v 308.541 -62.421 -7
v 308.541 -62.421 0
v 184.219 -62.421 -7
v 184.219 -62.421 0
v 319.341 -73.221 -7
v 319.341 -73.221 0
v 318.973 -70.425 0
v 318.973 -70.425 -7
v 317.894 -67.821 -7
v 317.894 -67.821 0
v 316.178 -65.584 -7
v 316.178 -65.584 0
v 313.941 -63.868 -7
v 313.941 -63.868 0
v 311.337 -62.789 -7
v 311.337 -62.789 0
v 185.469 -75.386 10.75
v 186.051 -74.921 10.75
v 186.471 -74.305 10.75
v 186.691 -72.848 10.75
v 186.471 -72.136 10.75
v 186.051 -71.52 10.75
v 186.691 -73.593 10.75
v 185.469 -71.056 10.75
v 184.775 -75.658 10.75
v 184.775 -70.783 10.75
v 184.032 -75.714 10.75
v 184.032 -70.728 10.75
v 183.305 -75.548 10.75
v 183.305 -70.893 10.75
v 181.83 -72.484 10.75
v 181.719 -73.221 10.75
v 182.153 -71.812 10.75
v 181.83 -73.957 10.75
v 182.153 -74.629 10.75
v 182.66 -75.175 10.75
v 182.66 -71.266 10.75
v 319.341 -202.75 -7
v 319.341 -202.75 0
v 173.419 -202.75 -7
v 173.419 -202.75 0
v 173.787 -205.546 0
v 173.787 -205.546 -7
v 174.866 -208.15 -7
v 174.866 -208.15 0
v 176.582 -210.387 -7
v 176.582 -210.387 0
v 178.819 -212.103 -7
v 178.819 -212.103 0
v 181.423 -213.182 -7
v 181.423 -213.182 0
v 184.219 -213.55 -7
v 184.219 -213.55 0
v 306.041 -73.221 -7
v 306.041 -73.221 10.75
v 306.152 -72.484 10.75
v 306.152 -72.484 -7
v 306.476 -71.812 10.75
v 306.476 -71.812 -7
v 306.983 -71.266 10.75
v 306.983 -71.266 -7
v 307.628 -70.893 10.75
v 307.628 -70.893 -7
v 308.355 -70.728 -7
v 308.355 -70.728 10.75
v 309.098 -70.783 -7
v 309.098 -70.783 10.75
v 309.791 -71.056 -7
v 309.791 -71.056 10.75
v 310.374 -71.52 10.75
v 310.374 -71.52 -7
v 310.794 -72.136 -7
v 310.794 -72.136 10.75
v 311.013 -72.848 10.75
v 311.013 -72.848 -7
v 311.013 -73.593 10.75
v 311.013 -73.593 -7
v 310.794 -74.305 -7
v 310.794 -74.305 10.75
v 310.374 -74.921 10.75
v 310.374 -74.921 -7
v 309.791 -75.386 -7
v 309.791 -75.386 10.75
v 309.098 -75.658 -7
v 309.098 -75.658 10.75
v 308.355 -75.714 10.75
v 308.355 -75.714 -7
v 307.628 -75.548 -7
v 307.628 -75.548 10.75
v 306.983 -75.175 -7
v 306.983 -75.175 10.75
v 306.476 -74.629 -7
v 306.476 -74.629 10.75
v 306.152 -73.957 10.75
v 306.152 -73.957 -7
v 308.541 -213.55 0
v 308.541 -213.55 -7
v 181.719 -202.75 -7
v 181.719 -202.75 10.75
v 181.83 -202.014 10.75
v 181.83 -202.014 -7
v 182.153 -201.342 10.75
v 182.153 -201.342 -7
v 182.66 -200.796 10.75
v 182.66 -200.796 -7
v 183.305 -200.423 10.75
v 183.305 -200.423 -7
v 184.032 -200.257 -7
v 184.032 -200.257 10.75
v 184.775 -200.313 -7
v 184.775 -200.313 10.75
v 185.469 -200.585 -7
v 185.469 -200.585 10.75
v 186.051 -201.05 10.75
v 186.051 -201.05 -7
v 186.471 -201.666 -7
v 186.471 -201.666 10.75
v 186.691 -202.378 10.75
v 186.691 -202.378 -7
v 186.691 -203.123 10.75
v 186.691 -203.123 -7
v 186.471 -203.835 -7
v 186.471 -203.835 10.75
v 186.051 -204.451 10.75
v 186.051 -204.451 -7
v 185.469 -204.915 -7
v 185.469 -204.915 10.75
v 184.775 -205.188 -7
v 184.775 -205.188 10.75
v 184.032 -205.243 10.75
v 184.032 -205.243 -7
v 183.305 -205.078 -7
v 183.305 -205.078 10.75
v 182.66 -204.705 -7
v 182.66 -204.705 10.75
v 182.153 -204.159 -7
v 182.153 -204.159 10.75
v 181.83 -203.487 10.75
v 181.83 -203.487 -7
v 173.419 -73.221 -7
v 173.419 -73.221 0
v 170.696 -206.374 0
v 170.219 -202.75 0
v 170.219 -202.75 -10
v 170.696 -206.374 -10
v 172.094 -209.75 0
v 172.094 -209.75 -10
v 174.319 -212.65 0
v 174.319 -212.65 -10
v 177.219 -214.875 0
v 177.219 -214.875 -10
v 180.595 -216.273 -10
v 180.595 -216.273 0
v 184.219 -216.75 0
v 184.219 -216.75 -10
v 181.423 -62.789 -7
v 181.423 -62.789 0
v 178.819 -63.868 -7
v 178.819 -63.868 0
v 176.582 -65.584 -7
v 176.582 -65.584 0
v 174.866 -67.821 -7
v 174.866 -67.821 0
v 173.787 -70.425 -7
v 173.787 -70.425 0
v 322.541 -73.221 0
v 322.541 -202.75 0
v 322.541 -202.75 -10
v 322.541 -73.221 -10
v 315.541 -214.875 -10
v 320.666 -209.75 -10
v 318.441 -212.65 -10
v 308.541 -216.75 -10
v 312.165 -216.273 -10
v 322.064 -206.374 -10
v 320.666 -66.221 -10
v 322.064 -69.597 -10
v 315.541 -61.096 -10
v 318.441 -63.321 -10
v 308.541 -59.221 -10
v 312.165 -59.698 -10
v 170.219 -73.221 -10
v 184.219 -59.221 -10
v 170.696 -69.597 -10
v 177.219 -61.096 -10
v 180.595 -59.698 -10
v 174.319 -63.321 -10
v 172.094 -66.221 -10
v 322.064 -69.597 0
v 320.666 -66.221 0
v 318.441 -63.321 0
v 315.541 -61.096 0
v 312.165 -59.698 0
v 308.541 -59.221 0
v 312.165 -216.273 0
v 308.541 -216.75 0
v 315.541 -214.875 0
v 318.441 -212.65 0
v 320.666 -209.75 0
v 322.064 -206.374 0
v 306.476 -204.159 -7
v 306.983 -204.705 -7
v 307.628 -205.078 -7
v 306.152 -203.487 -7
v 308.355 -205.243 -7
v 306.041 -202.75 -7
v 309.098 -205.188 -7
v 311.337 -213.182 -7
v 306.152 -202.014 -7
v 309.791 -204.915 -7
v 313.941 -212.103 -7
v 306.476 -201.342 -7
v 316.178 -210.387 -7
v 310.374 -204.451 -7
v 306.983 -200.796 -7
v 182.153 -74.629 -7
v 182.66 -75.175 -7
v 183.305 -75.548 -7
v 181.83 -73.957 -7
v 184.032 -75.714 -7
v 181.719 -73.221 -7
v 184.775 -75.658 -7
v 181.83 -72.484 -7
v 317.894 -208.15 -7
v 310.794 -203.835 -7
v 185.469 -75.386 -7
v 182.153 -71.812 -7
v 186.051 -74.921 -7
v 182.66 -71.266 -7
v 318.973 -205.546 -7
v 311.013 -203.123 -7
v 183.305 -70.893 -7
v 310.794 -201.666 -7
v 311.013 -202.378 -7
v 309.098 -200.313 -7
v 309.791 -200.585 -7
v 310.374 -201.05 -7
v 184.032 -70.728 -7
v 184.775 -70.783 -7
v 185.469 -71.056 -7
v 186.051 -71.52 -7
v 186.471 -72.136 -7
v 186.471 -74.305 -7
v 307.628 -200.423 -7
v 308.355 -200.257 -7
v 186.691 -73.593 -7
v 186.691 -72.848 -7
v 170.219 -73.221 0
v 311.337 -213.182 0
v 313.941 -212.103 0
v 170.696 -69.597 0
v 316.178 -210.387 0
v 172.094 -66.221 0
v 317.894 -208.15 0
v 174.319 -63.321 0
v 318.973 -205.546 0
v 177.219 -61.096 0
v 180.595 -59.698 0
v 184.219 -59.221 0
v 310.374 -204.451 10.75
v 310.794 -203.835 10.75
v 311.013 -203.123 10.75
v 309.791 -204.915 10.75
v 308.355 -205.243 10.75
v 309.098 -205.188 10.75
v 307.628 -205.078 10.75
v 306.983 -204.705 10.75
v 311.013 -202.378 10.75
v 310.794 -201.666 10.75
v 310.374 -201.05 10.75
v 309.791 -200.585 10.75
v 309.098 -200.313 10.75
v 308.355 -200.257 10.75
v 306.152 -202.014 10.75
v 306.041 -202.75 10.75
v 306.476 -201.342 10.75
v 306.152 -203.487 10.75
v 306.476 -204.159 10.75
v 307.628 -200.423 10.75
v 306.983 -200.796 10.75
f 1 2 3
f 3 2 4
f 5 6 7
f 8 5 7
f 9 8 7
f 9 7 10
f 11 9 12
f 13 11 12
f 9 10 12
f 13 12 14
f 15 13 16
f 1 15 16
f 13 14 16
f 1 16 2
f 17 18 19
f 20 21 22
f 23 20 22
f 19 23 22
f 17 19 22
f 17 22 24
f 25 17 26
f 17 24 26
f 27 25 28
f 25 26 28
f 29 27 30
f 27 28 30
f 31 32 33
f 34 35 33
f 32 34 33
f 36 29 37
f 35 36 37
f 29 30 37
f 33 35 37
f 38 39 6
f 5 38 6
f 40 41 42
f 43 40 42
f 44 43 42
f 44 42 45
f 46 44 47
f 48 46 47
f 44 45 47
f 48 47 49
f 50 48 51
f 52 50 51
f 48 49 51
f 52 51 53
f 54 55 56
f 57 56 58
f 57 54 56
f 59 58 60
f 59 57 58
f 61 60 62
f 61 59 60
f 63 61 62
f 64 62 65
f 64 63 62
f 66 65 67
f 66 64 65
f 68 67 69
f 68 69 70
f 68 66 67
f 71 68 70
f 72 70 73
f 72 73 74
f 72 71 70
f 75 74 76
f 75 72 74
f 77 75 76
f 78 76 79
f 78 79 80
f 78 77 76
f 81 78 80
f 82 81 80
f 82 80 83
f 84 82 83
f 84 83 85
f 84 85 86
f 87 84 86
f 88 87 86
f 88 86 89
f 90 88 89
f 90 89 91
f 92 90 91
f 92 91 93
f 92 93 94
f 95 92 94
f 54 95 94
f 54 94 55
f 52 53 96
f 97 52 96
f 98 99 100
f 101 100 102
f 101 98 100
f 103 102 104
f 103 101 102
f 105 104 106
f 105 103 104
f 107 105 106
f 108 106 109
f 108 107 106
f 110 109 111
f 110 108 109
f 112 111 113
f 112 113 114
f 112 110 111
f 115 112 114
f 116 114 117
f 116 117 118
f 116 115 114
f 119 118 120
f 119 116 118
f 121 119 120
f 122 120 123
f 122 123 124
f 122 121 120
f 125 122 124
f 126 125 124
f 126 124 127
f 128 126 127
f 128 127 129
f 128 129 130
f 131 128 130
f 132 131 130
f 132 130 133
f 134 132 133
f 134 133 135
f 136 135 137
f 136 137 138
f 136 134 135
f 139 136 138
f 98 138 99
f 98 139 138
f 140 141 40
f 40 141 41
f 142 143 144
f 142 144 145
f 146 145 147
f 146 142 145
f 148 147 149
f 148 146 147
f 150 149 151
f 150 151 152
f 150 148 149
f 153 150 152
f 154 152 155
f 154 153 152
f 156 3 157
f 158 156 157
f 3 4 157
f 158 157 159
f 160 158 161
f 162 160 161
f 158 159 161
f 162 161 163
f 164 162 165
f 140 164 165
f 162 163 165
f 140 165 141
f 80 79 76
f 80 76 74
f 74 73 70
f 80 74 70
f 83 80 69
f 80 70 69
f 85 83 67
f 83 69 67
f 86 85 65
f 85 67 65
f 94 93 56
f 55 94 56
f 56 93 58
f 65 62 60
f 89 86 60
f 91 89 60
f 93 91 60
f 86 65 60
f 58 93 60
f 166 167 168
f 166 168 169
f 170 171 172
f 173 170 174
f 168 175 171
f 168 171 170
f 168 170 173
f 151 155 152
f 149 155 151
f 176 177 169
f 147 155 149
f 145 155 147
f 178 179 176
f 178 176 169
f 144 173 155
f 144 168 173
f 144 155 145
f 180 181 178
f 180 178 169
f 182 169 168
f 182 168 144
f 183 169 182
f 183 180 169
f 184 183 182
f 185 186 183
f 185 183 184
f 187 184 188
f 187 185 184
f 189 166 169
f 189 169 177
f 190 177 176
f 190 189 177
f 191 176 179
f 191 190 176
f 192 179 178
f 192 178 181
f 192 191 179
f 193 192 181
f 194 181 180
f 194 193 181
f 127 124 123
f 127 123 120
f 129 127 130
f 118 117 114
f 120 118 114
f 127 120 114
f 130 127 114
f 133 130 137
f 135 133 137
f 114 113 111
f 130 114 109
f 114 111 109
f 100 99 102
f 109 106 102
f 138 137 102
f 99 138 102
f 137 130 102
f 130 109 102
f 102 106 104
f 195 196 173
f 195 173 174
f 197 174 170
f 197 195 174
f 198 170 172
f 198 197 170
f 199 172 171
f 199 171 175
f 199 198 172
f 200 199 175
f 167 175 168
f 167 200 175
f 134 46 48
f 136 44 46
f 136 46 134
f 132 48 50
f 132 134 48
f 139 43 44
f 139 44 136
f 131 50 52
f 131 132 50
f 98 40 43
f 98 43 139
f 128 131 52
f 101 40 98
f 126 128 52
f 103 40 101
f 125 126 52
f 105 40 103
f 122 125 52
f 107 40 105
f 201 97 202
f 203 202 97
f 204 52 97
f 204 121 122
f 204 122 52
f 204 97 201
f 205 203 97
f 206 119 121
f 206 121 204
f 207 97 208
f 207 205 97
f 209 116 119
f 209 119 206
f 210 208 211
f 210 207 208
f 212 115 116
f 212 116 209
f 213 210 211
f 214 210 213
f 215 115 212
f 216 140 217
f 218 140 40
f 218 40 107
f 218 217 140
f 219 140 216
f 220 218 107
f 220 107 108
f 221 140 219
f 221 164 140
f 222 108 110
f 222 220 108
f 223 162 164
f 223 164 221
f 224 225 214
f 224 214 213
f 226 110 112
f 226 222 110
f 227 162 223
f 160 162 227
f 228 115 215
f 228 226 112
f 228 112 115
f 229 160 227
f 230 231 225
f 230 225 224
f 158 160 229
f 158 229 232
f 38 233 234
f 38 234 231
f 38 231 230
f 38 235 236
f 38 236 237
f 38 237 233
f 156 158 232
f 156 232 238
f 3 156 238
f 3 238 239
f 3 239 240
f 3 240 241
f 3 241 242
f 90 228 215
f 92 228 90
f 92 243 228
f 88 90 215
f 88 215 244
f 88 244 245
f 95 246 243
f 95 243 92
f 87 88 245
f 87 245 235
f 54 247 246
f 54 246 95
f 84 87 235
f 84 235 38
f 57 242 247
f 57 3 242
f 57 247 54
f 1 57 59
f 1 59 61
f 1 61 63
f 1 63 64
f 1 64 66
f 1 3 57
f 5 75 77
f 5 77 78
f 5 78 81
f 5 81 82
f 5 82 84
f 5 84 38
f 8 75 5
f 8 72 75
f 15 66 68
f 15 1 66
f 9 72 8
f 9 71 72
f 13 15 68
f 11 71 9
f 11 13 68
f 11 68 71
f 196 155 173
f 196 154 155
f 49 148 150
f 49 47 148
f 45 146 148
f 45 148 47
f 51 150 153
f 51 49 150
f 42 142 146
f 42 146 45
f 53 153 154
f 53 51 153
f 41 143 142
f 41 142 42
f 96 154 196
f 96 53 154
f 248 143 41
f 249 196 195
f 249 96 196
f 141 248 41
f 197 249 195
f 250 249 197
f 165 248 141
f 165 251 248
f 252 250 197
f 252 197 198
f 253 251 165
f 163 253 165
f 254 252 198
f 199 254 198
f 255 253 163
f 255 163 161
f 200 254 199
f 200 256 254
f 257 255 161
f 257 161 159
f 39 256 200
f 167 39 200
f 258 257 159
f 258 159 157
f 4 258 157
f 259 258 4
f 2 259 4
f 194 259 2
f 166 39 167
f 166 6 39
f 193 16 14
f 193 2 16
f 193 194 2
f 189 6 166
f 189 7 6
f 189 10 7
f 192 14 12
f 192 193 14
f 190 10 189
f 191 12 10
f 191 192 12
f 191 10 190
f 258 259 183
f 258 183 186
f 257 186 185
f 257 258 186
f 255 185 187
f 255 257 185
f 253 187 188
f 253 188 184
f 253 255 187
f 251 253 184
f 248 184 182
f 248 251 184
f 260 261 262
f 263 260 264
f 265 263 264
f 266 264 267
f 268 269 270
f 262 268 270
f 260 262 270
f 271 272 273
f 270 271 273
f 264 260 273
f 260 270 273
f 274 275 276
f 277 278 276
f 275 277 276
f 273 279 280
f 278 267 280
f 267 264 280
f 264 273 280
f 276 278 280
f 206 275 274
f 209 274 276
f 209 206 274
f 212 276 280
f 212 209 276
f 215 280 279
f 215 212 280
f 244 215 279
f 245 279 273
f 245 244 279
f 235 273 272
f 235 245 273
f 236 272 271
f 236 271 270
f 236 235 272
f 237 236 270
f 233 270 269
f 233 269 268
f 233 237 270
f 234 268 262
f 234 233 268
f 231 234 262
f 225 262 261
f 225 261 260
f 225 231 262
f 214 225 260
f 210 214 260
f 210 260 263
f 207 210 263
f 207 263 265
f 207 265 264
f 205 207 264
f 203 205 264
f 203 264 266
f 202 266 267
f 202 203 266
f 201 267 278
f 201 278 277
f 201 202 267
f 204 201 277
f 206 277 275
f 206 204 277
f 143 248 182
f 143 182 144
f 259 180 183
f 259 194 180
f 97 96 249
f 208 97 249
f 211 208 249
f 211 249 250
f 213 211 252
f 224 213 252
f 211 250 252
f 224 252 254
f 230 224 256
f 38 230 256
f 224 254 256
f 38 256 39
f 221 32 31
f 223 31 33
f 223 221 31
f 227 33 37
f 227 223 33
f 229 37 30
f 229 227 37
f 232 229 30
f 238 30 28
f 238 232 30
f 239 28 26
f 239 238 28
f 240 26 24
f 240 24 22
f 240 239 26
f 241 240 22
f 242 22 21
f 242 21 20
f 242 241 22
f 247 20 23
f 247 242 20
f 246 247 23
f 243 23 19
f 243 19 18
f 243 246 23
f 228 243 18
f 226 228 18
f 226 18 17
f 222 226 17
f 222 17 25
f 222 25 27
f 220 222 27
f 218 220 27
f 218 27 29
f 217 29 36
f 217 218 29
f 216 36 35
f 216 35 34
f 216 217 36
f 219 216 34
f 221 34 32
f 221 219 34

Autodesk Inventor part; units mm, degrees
ref_plane "YZ Plane" through (0, 0, 0) normal (1, 0, 0) x (0, 1, 0)
ref_plane "XZ Plane" through (0, 0, 0) normal (0, 1, 0) x (-1, 0, 0)
ref_plane "XY Plane" through (0, 0, 0) normal (0, 0, 1) x (1, 0, 0)
ref_plane "Work Plane2" through (0, 0, 0) normal (0, 0, 1) x (1, 0, 0)
sketch "Sketch2" plane through (0, 0, 0) normal (0, 0, 1) x (1, 0, 0)
  line L0 (174.2186, -202.7504) -> (174.2186, -73.2206) projected
  arc A0 (184.2186, -63.2206) -> (174.2186, -73.2206) centre (184.2186, -73.2206) ccw projected
  circle A1 centre (184.2186, -73.2206) radius 3 projected
  line L1 (184.2186, -63.2206) -> (308.5414, -63.2206) projected
  circle A2 centre (308.5414, -73.2206) radius 3 projected
  arc A3 (318.5414, -73.2206) -> (308.5414, -63.2206) centre (308.5414, -73.2206) ccw projected
  line L2 (318.5414, -73.2206) -> (318.5414, -202.7504) projected
  arc A4 (308.5414, -212.7504) -> (318.5414, -202.7504) centre (308.5414, -202.7504) ccw projected
  line L3 (308.5414, -212.7504) -> (184.2186, -212.7504) projected
  arc A5 (174.2186, -202.7504) -> (184.2186, -212.7504) centre (184.2186, -202.7504) ccw projected
  circle A6 centre (184.2186, -202.7504) radius 3 projected
  circle A7 centre (308.5414, -202.7504) radius 3 projected
  line L4 (308.5414, -59.2206) -> (184.2186, -59.2206)
  arc A8 (184.2186, -59.2206) -> (170.2186, -73.2206) centre (184.2186, -73.2206) ccw
  line L5 (170.2186, -73.2206) -> (170.2186, -202.7504)
  arc A9 (170.2186, -202.7504) -> (184.2186, -216.7504) centre (184.2186, -202.7504) ccw
  line L6 (184.2186, -216.7504) -> (308.5414, -216.7504)
  arc A10 (308.5414, -216.7504) -> (322.5414, -202.7504) centre (308.5414, -202.7504) ccw
  line L7 (322.5414, -202.7504) -> (322.5414, -73.2206)
  arc A11 (322.5414, -73.2206) -> (308.5414, -59.2206) centre (308.5414, -73.2206) ccw
  arc A12 (184.2186, -63.7206) -> (174.7186, -73.2206) centre (184.2186, -73.2206) ccw
  point P0 (0, 0)
  dimension "d8" = 4
ref_plane "Work Plane3" through (0, 0, 0) normal (0, 0, 1) x (1, 0, 0)
extrude "Extrusion3" add sketch "Sketch2" against normal blind 10 contours L0 A0 L1 A3 L2 A4 L3 A5 | A11 L7 A10 L6 A9 L5 A8 L4
sketch "Sketch4" plane through (0, 0, 0) normal (0, 0, 1) x (1, 0, 0)
  circle A0 centre (308.5414, -202.7504) radius 3 projected
  circle A1 centre (184.2186, -202.7504) radius 3 projected
  circle A2 centre (308.5414, -73.2206) radius 3 projected
  circle A3 centre (184.2186, -73.2206) radius 3 projected
  arc A4 (184.2186, -59.2206) -> (170.2186, -73.2206) centre (184.2186, -73.2206) ccw projected
  line L0 (170.2186, -73.2206) -> (170.2186, -202.7504) projected
  arc A5 (170.2186, -202.7504) -> (184.2186, -216.7504) centre (184.2186, -202.7504) ccw projected
  line L1 (184.2186, -216.7504) -> (308.5414, -216.7504) projected
  arc A6 (308.5414, -216.7504) -> (322.5414, -202.7504) centre (308.5414, -202.7504) ccw projected
  line L2 (322.5414, -202.7504) -> (322.5414, -73.2206) projected
  arc A7 (322.5414, -73.2206) -> (308.5414, -59.2206) centre (308.5414, -73.2206) ccw projected
  line L3 (308.5414, -59.2206) -> (184.2186, -59.2206) projected
  arc A8 (184.2186, -62.4206) -> (173.4186, -73.2206) centre (184.2186, -73.2206) ccw
  line L4 (173.4186, -73.2206) -> (173.4186, -202.7504)
  arc A9 (173.4186, -202.7504) -> (184.2186, -213.5504) centre (184.2186, -202.7504) ccw
  line L5 (184.2186, -213.5504) -> (308.5414, -213.5504)
  arc A10 (308.5414, -213.5504) -> (319.3414, -202.7504) centre (308.5414, -202.7504) ccw
  line L6 (319.3414, -202.7504) -> (319.3414, -73.2206)
  arc A11 (319.3414, -73.2206) -> (308.5414, -62.4206) centre (308.5414, -73.2206) ccw
  line L7 (308.5414, -62.4206) -> (184.2186, -62.4206)
  point P0 (0, 0)
  dimension "d10" = 3.2
extrude "Extrusion4" cut sketch "Sketch4" against normal blind 7 contours L7 A11 L6 A10 L5 A9 L4 A8
sketch "Sketch5" plane through (0, 0, -10) normal (0, 0, -1) x (-1, 0, 0)
  circle A0 centre (-308.5414, -202.7504) radius 3 projected
  circle A1 centre (-184.2186, -202.7504) radius 3 projected
  circle A2 centre (-308.5414, -73.2206) radius 3 projected
  circle A3 centre (-184.2186, -73.2206) radius 3 projected
  circle A4 centre (-308.5414, -73.2206) radius 2.5
  circle A5 centre (-184.2186, -73.2206) radius 2.5
  circle A6 centre (-184.2186, -202.7504) radius 2.5
  circle A7 centre (-308.5414, -202.7504) radius 2.5
  point P0 (0, 0)
  dimension "d15" = 0.5
  dimension "d16" = 0.5
  dimension "d17" = 0.5
  dimension "d18" = 0.5
extrude "Extrusion5" add sketch "Sketch5" against normal up to surface (3 mm away)
sketch "Sketch6" plane through (0, 0, -10) normal (0, 0, -1) x (-1, 0, 0)
  circle A0 centre (-184.2186, -202.7504) radius 2.5 projected
  circle A1 centre (-308.5414, -73.2206) radius 2.5 projected
  circle A2 centre (-308.5414, -202.7504) radius 2.5 projected
  circle A3 centre (-184.2186, -73.2206) radius 2.5 projected
  point P0 (0, 0)
extrude "Extrusion6" add sketch "Sketch6" against normal blind 20.75
properties part number "Part_atas"
